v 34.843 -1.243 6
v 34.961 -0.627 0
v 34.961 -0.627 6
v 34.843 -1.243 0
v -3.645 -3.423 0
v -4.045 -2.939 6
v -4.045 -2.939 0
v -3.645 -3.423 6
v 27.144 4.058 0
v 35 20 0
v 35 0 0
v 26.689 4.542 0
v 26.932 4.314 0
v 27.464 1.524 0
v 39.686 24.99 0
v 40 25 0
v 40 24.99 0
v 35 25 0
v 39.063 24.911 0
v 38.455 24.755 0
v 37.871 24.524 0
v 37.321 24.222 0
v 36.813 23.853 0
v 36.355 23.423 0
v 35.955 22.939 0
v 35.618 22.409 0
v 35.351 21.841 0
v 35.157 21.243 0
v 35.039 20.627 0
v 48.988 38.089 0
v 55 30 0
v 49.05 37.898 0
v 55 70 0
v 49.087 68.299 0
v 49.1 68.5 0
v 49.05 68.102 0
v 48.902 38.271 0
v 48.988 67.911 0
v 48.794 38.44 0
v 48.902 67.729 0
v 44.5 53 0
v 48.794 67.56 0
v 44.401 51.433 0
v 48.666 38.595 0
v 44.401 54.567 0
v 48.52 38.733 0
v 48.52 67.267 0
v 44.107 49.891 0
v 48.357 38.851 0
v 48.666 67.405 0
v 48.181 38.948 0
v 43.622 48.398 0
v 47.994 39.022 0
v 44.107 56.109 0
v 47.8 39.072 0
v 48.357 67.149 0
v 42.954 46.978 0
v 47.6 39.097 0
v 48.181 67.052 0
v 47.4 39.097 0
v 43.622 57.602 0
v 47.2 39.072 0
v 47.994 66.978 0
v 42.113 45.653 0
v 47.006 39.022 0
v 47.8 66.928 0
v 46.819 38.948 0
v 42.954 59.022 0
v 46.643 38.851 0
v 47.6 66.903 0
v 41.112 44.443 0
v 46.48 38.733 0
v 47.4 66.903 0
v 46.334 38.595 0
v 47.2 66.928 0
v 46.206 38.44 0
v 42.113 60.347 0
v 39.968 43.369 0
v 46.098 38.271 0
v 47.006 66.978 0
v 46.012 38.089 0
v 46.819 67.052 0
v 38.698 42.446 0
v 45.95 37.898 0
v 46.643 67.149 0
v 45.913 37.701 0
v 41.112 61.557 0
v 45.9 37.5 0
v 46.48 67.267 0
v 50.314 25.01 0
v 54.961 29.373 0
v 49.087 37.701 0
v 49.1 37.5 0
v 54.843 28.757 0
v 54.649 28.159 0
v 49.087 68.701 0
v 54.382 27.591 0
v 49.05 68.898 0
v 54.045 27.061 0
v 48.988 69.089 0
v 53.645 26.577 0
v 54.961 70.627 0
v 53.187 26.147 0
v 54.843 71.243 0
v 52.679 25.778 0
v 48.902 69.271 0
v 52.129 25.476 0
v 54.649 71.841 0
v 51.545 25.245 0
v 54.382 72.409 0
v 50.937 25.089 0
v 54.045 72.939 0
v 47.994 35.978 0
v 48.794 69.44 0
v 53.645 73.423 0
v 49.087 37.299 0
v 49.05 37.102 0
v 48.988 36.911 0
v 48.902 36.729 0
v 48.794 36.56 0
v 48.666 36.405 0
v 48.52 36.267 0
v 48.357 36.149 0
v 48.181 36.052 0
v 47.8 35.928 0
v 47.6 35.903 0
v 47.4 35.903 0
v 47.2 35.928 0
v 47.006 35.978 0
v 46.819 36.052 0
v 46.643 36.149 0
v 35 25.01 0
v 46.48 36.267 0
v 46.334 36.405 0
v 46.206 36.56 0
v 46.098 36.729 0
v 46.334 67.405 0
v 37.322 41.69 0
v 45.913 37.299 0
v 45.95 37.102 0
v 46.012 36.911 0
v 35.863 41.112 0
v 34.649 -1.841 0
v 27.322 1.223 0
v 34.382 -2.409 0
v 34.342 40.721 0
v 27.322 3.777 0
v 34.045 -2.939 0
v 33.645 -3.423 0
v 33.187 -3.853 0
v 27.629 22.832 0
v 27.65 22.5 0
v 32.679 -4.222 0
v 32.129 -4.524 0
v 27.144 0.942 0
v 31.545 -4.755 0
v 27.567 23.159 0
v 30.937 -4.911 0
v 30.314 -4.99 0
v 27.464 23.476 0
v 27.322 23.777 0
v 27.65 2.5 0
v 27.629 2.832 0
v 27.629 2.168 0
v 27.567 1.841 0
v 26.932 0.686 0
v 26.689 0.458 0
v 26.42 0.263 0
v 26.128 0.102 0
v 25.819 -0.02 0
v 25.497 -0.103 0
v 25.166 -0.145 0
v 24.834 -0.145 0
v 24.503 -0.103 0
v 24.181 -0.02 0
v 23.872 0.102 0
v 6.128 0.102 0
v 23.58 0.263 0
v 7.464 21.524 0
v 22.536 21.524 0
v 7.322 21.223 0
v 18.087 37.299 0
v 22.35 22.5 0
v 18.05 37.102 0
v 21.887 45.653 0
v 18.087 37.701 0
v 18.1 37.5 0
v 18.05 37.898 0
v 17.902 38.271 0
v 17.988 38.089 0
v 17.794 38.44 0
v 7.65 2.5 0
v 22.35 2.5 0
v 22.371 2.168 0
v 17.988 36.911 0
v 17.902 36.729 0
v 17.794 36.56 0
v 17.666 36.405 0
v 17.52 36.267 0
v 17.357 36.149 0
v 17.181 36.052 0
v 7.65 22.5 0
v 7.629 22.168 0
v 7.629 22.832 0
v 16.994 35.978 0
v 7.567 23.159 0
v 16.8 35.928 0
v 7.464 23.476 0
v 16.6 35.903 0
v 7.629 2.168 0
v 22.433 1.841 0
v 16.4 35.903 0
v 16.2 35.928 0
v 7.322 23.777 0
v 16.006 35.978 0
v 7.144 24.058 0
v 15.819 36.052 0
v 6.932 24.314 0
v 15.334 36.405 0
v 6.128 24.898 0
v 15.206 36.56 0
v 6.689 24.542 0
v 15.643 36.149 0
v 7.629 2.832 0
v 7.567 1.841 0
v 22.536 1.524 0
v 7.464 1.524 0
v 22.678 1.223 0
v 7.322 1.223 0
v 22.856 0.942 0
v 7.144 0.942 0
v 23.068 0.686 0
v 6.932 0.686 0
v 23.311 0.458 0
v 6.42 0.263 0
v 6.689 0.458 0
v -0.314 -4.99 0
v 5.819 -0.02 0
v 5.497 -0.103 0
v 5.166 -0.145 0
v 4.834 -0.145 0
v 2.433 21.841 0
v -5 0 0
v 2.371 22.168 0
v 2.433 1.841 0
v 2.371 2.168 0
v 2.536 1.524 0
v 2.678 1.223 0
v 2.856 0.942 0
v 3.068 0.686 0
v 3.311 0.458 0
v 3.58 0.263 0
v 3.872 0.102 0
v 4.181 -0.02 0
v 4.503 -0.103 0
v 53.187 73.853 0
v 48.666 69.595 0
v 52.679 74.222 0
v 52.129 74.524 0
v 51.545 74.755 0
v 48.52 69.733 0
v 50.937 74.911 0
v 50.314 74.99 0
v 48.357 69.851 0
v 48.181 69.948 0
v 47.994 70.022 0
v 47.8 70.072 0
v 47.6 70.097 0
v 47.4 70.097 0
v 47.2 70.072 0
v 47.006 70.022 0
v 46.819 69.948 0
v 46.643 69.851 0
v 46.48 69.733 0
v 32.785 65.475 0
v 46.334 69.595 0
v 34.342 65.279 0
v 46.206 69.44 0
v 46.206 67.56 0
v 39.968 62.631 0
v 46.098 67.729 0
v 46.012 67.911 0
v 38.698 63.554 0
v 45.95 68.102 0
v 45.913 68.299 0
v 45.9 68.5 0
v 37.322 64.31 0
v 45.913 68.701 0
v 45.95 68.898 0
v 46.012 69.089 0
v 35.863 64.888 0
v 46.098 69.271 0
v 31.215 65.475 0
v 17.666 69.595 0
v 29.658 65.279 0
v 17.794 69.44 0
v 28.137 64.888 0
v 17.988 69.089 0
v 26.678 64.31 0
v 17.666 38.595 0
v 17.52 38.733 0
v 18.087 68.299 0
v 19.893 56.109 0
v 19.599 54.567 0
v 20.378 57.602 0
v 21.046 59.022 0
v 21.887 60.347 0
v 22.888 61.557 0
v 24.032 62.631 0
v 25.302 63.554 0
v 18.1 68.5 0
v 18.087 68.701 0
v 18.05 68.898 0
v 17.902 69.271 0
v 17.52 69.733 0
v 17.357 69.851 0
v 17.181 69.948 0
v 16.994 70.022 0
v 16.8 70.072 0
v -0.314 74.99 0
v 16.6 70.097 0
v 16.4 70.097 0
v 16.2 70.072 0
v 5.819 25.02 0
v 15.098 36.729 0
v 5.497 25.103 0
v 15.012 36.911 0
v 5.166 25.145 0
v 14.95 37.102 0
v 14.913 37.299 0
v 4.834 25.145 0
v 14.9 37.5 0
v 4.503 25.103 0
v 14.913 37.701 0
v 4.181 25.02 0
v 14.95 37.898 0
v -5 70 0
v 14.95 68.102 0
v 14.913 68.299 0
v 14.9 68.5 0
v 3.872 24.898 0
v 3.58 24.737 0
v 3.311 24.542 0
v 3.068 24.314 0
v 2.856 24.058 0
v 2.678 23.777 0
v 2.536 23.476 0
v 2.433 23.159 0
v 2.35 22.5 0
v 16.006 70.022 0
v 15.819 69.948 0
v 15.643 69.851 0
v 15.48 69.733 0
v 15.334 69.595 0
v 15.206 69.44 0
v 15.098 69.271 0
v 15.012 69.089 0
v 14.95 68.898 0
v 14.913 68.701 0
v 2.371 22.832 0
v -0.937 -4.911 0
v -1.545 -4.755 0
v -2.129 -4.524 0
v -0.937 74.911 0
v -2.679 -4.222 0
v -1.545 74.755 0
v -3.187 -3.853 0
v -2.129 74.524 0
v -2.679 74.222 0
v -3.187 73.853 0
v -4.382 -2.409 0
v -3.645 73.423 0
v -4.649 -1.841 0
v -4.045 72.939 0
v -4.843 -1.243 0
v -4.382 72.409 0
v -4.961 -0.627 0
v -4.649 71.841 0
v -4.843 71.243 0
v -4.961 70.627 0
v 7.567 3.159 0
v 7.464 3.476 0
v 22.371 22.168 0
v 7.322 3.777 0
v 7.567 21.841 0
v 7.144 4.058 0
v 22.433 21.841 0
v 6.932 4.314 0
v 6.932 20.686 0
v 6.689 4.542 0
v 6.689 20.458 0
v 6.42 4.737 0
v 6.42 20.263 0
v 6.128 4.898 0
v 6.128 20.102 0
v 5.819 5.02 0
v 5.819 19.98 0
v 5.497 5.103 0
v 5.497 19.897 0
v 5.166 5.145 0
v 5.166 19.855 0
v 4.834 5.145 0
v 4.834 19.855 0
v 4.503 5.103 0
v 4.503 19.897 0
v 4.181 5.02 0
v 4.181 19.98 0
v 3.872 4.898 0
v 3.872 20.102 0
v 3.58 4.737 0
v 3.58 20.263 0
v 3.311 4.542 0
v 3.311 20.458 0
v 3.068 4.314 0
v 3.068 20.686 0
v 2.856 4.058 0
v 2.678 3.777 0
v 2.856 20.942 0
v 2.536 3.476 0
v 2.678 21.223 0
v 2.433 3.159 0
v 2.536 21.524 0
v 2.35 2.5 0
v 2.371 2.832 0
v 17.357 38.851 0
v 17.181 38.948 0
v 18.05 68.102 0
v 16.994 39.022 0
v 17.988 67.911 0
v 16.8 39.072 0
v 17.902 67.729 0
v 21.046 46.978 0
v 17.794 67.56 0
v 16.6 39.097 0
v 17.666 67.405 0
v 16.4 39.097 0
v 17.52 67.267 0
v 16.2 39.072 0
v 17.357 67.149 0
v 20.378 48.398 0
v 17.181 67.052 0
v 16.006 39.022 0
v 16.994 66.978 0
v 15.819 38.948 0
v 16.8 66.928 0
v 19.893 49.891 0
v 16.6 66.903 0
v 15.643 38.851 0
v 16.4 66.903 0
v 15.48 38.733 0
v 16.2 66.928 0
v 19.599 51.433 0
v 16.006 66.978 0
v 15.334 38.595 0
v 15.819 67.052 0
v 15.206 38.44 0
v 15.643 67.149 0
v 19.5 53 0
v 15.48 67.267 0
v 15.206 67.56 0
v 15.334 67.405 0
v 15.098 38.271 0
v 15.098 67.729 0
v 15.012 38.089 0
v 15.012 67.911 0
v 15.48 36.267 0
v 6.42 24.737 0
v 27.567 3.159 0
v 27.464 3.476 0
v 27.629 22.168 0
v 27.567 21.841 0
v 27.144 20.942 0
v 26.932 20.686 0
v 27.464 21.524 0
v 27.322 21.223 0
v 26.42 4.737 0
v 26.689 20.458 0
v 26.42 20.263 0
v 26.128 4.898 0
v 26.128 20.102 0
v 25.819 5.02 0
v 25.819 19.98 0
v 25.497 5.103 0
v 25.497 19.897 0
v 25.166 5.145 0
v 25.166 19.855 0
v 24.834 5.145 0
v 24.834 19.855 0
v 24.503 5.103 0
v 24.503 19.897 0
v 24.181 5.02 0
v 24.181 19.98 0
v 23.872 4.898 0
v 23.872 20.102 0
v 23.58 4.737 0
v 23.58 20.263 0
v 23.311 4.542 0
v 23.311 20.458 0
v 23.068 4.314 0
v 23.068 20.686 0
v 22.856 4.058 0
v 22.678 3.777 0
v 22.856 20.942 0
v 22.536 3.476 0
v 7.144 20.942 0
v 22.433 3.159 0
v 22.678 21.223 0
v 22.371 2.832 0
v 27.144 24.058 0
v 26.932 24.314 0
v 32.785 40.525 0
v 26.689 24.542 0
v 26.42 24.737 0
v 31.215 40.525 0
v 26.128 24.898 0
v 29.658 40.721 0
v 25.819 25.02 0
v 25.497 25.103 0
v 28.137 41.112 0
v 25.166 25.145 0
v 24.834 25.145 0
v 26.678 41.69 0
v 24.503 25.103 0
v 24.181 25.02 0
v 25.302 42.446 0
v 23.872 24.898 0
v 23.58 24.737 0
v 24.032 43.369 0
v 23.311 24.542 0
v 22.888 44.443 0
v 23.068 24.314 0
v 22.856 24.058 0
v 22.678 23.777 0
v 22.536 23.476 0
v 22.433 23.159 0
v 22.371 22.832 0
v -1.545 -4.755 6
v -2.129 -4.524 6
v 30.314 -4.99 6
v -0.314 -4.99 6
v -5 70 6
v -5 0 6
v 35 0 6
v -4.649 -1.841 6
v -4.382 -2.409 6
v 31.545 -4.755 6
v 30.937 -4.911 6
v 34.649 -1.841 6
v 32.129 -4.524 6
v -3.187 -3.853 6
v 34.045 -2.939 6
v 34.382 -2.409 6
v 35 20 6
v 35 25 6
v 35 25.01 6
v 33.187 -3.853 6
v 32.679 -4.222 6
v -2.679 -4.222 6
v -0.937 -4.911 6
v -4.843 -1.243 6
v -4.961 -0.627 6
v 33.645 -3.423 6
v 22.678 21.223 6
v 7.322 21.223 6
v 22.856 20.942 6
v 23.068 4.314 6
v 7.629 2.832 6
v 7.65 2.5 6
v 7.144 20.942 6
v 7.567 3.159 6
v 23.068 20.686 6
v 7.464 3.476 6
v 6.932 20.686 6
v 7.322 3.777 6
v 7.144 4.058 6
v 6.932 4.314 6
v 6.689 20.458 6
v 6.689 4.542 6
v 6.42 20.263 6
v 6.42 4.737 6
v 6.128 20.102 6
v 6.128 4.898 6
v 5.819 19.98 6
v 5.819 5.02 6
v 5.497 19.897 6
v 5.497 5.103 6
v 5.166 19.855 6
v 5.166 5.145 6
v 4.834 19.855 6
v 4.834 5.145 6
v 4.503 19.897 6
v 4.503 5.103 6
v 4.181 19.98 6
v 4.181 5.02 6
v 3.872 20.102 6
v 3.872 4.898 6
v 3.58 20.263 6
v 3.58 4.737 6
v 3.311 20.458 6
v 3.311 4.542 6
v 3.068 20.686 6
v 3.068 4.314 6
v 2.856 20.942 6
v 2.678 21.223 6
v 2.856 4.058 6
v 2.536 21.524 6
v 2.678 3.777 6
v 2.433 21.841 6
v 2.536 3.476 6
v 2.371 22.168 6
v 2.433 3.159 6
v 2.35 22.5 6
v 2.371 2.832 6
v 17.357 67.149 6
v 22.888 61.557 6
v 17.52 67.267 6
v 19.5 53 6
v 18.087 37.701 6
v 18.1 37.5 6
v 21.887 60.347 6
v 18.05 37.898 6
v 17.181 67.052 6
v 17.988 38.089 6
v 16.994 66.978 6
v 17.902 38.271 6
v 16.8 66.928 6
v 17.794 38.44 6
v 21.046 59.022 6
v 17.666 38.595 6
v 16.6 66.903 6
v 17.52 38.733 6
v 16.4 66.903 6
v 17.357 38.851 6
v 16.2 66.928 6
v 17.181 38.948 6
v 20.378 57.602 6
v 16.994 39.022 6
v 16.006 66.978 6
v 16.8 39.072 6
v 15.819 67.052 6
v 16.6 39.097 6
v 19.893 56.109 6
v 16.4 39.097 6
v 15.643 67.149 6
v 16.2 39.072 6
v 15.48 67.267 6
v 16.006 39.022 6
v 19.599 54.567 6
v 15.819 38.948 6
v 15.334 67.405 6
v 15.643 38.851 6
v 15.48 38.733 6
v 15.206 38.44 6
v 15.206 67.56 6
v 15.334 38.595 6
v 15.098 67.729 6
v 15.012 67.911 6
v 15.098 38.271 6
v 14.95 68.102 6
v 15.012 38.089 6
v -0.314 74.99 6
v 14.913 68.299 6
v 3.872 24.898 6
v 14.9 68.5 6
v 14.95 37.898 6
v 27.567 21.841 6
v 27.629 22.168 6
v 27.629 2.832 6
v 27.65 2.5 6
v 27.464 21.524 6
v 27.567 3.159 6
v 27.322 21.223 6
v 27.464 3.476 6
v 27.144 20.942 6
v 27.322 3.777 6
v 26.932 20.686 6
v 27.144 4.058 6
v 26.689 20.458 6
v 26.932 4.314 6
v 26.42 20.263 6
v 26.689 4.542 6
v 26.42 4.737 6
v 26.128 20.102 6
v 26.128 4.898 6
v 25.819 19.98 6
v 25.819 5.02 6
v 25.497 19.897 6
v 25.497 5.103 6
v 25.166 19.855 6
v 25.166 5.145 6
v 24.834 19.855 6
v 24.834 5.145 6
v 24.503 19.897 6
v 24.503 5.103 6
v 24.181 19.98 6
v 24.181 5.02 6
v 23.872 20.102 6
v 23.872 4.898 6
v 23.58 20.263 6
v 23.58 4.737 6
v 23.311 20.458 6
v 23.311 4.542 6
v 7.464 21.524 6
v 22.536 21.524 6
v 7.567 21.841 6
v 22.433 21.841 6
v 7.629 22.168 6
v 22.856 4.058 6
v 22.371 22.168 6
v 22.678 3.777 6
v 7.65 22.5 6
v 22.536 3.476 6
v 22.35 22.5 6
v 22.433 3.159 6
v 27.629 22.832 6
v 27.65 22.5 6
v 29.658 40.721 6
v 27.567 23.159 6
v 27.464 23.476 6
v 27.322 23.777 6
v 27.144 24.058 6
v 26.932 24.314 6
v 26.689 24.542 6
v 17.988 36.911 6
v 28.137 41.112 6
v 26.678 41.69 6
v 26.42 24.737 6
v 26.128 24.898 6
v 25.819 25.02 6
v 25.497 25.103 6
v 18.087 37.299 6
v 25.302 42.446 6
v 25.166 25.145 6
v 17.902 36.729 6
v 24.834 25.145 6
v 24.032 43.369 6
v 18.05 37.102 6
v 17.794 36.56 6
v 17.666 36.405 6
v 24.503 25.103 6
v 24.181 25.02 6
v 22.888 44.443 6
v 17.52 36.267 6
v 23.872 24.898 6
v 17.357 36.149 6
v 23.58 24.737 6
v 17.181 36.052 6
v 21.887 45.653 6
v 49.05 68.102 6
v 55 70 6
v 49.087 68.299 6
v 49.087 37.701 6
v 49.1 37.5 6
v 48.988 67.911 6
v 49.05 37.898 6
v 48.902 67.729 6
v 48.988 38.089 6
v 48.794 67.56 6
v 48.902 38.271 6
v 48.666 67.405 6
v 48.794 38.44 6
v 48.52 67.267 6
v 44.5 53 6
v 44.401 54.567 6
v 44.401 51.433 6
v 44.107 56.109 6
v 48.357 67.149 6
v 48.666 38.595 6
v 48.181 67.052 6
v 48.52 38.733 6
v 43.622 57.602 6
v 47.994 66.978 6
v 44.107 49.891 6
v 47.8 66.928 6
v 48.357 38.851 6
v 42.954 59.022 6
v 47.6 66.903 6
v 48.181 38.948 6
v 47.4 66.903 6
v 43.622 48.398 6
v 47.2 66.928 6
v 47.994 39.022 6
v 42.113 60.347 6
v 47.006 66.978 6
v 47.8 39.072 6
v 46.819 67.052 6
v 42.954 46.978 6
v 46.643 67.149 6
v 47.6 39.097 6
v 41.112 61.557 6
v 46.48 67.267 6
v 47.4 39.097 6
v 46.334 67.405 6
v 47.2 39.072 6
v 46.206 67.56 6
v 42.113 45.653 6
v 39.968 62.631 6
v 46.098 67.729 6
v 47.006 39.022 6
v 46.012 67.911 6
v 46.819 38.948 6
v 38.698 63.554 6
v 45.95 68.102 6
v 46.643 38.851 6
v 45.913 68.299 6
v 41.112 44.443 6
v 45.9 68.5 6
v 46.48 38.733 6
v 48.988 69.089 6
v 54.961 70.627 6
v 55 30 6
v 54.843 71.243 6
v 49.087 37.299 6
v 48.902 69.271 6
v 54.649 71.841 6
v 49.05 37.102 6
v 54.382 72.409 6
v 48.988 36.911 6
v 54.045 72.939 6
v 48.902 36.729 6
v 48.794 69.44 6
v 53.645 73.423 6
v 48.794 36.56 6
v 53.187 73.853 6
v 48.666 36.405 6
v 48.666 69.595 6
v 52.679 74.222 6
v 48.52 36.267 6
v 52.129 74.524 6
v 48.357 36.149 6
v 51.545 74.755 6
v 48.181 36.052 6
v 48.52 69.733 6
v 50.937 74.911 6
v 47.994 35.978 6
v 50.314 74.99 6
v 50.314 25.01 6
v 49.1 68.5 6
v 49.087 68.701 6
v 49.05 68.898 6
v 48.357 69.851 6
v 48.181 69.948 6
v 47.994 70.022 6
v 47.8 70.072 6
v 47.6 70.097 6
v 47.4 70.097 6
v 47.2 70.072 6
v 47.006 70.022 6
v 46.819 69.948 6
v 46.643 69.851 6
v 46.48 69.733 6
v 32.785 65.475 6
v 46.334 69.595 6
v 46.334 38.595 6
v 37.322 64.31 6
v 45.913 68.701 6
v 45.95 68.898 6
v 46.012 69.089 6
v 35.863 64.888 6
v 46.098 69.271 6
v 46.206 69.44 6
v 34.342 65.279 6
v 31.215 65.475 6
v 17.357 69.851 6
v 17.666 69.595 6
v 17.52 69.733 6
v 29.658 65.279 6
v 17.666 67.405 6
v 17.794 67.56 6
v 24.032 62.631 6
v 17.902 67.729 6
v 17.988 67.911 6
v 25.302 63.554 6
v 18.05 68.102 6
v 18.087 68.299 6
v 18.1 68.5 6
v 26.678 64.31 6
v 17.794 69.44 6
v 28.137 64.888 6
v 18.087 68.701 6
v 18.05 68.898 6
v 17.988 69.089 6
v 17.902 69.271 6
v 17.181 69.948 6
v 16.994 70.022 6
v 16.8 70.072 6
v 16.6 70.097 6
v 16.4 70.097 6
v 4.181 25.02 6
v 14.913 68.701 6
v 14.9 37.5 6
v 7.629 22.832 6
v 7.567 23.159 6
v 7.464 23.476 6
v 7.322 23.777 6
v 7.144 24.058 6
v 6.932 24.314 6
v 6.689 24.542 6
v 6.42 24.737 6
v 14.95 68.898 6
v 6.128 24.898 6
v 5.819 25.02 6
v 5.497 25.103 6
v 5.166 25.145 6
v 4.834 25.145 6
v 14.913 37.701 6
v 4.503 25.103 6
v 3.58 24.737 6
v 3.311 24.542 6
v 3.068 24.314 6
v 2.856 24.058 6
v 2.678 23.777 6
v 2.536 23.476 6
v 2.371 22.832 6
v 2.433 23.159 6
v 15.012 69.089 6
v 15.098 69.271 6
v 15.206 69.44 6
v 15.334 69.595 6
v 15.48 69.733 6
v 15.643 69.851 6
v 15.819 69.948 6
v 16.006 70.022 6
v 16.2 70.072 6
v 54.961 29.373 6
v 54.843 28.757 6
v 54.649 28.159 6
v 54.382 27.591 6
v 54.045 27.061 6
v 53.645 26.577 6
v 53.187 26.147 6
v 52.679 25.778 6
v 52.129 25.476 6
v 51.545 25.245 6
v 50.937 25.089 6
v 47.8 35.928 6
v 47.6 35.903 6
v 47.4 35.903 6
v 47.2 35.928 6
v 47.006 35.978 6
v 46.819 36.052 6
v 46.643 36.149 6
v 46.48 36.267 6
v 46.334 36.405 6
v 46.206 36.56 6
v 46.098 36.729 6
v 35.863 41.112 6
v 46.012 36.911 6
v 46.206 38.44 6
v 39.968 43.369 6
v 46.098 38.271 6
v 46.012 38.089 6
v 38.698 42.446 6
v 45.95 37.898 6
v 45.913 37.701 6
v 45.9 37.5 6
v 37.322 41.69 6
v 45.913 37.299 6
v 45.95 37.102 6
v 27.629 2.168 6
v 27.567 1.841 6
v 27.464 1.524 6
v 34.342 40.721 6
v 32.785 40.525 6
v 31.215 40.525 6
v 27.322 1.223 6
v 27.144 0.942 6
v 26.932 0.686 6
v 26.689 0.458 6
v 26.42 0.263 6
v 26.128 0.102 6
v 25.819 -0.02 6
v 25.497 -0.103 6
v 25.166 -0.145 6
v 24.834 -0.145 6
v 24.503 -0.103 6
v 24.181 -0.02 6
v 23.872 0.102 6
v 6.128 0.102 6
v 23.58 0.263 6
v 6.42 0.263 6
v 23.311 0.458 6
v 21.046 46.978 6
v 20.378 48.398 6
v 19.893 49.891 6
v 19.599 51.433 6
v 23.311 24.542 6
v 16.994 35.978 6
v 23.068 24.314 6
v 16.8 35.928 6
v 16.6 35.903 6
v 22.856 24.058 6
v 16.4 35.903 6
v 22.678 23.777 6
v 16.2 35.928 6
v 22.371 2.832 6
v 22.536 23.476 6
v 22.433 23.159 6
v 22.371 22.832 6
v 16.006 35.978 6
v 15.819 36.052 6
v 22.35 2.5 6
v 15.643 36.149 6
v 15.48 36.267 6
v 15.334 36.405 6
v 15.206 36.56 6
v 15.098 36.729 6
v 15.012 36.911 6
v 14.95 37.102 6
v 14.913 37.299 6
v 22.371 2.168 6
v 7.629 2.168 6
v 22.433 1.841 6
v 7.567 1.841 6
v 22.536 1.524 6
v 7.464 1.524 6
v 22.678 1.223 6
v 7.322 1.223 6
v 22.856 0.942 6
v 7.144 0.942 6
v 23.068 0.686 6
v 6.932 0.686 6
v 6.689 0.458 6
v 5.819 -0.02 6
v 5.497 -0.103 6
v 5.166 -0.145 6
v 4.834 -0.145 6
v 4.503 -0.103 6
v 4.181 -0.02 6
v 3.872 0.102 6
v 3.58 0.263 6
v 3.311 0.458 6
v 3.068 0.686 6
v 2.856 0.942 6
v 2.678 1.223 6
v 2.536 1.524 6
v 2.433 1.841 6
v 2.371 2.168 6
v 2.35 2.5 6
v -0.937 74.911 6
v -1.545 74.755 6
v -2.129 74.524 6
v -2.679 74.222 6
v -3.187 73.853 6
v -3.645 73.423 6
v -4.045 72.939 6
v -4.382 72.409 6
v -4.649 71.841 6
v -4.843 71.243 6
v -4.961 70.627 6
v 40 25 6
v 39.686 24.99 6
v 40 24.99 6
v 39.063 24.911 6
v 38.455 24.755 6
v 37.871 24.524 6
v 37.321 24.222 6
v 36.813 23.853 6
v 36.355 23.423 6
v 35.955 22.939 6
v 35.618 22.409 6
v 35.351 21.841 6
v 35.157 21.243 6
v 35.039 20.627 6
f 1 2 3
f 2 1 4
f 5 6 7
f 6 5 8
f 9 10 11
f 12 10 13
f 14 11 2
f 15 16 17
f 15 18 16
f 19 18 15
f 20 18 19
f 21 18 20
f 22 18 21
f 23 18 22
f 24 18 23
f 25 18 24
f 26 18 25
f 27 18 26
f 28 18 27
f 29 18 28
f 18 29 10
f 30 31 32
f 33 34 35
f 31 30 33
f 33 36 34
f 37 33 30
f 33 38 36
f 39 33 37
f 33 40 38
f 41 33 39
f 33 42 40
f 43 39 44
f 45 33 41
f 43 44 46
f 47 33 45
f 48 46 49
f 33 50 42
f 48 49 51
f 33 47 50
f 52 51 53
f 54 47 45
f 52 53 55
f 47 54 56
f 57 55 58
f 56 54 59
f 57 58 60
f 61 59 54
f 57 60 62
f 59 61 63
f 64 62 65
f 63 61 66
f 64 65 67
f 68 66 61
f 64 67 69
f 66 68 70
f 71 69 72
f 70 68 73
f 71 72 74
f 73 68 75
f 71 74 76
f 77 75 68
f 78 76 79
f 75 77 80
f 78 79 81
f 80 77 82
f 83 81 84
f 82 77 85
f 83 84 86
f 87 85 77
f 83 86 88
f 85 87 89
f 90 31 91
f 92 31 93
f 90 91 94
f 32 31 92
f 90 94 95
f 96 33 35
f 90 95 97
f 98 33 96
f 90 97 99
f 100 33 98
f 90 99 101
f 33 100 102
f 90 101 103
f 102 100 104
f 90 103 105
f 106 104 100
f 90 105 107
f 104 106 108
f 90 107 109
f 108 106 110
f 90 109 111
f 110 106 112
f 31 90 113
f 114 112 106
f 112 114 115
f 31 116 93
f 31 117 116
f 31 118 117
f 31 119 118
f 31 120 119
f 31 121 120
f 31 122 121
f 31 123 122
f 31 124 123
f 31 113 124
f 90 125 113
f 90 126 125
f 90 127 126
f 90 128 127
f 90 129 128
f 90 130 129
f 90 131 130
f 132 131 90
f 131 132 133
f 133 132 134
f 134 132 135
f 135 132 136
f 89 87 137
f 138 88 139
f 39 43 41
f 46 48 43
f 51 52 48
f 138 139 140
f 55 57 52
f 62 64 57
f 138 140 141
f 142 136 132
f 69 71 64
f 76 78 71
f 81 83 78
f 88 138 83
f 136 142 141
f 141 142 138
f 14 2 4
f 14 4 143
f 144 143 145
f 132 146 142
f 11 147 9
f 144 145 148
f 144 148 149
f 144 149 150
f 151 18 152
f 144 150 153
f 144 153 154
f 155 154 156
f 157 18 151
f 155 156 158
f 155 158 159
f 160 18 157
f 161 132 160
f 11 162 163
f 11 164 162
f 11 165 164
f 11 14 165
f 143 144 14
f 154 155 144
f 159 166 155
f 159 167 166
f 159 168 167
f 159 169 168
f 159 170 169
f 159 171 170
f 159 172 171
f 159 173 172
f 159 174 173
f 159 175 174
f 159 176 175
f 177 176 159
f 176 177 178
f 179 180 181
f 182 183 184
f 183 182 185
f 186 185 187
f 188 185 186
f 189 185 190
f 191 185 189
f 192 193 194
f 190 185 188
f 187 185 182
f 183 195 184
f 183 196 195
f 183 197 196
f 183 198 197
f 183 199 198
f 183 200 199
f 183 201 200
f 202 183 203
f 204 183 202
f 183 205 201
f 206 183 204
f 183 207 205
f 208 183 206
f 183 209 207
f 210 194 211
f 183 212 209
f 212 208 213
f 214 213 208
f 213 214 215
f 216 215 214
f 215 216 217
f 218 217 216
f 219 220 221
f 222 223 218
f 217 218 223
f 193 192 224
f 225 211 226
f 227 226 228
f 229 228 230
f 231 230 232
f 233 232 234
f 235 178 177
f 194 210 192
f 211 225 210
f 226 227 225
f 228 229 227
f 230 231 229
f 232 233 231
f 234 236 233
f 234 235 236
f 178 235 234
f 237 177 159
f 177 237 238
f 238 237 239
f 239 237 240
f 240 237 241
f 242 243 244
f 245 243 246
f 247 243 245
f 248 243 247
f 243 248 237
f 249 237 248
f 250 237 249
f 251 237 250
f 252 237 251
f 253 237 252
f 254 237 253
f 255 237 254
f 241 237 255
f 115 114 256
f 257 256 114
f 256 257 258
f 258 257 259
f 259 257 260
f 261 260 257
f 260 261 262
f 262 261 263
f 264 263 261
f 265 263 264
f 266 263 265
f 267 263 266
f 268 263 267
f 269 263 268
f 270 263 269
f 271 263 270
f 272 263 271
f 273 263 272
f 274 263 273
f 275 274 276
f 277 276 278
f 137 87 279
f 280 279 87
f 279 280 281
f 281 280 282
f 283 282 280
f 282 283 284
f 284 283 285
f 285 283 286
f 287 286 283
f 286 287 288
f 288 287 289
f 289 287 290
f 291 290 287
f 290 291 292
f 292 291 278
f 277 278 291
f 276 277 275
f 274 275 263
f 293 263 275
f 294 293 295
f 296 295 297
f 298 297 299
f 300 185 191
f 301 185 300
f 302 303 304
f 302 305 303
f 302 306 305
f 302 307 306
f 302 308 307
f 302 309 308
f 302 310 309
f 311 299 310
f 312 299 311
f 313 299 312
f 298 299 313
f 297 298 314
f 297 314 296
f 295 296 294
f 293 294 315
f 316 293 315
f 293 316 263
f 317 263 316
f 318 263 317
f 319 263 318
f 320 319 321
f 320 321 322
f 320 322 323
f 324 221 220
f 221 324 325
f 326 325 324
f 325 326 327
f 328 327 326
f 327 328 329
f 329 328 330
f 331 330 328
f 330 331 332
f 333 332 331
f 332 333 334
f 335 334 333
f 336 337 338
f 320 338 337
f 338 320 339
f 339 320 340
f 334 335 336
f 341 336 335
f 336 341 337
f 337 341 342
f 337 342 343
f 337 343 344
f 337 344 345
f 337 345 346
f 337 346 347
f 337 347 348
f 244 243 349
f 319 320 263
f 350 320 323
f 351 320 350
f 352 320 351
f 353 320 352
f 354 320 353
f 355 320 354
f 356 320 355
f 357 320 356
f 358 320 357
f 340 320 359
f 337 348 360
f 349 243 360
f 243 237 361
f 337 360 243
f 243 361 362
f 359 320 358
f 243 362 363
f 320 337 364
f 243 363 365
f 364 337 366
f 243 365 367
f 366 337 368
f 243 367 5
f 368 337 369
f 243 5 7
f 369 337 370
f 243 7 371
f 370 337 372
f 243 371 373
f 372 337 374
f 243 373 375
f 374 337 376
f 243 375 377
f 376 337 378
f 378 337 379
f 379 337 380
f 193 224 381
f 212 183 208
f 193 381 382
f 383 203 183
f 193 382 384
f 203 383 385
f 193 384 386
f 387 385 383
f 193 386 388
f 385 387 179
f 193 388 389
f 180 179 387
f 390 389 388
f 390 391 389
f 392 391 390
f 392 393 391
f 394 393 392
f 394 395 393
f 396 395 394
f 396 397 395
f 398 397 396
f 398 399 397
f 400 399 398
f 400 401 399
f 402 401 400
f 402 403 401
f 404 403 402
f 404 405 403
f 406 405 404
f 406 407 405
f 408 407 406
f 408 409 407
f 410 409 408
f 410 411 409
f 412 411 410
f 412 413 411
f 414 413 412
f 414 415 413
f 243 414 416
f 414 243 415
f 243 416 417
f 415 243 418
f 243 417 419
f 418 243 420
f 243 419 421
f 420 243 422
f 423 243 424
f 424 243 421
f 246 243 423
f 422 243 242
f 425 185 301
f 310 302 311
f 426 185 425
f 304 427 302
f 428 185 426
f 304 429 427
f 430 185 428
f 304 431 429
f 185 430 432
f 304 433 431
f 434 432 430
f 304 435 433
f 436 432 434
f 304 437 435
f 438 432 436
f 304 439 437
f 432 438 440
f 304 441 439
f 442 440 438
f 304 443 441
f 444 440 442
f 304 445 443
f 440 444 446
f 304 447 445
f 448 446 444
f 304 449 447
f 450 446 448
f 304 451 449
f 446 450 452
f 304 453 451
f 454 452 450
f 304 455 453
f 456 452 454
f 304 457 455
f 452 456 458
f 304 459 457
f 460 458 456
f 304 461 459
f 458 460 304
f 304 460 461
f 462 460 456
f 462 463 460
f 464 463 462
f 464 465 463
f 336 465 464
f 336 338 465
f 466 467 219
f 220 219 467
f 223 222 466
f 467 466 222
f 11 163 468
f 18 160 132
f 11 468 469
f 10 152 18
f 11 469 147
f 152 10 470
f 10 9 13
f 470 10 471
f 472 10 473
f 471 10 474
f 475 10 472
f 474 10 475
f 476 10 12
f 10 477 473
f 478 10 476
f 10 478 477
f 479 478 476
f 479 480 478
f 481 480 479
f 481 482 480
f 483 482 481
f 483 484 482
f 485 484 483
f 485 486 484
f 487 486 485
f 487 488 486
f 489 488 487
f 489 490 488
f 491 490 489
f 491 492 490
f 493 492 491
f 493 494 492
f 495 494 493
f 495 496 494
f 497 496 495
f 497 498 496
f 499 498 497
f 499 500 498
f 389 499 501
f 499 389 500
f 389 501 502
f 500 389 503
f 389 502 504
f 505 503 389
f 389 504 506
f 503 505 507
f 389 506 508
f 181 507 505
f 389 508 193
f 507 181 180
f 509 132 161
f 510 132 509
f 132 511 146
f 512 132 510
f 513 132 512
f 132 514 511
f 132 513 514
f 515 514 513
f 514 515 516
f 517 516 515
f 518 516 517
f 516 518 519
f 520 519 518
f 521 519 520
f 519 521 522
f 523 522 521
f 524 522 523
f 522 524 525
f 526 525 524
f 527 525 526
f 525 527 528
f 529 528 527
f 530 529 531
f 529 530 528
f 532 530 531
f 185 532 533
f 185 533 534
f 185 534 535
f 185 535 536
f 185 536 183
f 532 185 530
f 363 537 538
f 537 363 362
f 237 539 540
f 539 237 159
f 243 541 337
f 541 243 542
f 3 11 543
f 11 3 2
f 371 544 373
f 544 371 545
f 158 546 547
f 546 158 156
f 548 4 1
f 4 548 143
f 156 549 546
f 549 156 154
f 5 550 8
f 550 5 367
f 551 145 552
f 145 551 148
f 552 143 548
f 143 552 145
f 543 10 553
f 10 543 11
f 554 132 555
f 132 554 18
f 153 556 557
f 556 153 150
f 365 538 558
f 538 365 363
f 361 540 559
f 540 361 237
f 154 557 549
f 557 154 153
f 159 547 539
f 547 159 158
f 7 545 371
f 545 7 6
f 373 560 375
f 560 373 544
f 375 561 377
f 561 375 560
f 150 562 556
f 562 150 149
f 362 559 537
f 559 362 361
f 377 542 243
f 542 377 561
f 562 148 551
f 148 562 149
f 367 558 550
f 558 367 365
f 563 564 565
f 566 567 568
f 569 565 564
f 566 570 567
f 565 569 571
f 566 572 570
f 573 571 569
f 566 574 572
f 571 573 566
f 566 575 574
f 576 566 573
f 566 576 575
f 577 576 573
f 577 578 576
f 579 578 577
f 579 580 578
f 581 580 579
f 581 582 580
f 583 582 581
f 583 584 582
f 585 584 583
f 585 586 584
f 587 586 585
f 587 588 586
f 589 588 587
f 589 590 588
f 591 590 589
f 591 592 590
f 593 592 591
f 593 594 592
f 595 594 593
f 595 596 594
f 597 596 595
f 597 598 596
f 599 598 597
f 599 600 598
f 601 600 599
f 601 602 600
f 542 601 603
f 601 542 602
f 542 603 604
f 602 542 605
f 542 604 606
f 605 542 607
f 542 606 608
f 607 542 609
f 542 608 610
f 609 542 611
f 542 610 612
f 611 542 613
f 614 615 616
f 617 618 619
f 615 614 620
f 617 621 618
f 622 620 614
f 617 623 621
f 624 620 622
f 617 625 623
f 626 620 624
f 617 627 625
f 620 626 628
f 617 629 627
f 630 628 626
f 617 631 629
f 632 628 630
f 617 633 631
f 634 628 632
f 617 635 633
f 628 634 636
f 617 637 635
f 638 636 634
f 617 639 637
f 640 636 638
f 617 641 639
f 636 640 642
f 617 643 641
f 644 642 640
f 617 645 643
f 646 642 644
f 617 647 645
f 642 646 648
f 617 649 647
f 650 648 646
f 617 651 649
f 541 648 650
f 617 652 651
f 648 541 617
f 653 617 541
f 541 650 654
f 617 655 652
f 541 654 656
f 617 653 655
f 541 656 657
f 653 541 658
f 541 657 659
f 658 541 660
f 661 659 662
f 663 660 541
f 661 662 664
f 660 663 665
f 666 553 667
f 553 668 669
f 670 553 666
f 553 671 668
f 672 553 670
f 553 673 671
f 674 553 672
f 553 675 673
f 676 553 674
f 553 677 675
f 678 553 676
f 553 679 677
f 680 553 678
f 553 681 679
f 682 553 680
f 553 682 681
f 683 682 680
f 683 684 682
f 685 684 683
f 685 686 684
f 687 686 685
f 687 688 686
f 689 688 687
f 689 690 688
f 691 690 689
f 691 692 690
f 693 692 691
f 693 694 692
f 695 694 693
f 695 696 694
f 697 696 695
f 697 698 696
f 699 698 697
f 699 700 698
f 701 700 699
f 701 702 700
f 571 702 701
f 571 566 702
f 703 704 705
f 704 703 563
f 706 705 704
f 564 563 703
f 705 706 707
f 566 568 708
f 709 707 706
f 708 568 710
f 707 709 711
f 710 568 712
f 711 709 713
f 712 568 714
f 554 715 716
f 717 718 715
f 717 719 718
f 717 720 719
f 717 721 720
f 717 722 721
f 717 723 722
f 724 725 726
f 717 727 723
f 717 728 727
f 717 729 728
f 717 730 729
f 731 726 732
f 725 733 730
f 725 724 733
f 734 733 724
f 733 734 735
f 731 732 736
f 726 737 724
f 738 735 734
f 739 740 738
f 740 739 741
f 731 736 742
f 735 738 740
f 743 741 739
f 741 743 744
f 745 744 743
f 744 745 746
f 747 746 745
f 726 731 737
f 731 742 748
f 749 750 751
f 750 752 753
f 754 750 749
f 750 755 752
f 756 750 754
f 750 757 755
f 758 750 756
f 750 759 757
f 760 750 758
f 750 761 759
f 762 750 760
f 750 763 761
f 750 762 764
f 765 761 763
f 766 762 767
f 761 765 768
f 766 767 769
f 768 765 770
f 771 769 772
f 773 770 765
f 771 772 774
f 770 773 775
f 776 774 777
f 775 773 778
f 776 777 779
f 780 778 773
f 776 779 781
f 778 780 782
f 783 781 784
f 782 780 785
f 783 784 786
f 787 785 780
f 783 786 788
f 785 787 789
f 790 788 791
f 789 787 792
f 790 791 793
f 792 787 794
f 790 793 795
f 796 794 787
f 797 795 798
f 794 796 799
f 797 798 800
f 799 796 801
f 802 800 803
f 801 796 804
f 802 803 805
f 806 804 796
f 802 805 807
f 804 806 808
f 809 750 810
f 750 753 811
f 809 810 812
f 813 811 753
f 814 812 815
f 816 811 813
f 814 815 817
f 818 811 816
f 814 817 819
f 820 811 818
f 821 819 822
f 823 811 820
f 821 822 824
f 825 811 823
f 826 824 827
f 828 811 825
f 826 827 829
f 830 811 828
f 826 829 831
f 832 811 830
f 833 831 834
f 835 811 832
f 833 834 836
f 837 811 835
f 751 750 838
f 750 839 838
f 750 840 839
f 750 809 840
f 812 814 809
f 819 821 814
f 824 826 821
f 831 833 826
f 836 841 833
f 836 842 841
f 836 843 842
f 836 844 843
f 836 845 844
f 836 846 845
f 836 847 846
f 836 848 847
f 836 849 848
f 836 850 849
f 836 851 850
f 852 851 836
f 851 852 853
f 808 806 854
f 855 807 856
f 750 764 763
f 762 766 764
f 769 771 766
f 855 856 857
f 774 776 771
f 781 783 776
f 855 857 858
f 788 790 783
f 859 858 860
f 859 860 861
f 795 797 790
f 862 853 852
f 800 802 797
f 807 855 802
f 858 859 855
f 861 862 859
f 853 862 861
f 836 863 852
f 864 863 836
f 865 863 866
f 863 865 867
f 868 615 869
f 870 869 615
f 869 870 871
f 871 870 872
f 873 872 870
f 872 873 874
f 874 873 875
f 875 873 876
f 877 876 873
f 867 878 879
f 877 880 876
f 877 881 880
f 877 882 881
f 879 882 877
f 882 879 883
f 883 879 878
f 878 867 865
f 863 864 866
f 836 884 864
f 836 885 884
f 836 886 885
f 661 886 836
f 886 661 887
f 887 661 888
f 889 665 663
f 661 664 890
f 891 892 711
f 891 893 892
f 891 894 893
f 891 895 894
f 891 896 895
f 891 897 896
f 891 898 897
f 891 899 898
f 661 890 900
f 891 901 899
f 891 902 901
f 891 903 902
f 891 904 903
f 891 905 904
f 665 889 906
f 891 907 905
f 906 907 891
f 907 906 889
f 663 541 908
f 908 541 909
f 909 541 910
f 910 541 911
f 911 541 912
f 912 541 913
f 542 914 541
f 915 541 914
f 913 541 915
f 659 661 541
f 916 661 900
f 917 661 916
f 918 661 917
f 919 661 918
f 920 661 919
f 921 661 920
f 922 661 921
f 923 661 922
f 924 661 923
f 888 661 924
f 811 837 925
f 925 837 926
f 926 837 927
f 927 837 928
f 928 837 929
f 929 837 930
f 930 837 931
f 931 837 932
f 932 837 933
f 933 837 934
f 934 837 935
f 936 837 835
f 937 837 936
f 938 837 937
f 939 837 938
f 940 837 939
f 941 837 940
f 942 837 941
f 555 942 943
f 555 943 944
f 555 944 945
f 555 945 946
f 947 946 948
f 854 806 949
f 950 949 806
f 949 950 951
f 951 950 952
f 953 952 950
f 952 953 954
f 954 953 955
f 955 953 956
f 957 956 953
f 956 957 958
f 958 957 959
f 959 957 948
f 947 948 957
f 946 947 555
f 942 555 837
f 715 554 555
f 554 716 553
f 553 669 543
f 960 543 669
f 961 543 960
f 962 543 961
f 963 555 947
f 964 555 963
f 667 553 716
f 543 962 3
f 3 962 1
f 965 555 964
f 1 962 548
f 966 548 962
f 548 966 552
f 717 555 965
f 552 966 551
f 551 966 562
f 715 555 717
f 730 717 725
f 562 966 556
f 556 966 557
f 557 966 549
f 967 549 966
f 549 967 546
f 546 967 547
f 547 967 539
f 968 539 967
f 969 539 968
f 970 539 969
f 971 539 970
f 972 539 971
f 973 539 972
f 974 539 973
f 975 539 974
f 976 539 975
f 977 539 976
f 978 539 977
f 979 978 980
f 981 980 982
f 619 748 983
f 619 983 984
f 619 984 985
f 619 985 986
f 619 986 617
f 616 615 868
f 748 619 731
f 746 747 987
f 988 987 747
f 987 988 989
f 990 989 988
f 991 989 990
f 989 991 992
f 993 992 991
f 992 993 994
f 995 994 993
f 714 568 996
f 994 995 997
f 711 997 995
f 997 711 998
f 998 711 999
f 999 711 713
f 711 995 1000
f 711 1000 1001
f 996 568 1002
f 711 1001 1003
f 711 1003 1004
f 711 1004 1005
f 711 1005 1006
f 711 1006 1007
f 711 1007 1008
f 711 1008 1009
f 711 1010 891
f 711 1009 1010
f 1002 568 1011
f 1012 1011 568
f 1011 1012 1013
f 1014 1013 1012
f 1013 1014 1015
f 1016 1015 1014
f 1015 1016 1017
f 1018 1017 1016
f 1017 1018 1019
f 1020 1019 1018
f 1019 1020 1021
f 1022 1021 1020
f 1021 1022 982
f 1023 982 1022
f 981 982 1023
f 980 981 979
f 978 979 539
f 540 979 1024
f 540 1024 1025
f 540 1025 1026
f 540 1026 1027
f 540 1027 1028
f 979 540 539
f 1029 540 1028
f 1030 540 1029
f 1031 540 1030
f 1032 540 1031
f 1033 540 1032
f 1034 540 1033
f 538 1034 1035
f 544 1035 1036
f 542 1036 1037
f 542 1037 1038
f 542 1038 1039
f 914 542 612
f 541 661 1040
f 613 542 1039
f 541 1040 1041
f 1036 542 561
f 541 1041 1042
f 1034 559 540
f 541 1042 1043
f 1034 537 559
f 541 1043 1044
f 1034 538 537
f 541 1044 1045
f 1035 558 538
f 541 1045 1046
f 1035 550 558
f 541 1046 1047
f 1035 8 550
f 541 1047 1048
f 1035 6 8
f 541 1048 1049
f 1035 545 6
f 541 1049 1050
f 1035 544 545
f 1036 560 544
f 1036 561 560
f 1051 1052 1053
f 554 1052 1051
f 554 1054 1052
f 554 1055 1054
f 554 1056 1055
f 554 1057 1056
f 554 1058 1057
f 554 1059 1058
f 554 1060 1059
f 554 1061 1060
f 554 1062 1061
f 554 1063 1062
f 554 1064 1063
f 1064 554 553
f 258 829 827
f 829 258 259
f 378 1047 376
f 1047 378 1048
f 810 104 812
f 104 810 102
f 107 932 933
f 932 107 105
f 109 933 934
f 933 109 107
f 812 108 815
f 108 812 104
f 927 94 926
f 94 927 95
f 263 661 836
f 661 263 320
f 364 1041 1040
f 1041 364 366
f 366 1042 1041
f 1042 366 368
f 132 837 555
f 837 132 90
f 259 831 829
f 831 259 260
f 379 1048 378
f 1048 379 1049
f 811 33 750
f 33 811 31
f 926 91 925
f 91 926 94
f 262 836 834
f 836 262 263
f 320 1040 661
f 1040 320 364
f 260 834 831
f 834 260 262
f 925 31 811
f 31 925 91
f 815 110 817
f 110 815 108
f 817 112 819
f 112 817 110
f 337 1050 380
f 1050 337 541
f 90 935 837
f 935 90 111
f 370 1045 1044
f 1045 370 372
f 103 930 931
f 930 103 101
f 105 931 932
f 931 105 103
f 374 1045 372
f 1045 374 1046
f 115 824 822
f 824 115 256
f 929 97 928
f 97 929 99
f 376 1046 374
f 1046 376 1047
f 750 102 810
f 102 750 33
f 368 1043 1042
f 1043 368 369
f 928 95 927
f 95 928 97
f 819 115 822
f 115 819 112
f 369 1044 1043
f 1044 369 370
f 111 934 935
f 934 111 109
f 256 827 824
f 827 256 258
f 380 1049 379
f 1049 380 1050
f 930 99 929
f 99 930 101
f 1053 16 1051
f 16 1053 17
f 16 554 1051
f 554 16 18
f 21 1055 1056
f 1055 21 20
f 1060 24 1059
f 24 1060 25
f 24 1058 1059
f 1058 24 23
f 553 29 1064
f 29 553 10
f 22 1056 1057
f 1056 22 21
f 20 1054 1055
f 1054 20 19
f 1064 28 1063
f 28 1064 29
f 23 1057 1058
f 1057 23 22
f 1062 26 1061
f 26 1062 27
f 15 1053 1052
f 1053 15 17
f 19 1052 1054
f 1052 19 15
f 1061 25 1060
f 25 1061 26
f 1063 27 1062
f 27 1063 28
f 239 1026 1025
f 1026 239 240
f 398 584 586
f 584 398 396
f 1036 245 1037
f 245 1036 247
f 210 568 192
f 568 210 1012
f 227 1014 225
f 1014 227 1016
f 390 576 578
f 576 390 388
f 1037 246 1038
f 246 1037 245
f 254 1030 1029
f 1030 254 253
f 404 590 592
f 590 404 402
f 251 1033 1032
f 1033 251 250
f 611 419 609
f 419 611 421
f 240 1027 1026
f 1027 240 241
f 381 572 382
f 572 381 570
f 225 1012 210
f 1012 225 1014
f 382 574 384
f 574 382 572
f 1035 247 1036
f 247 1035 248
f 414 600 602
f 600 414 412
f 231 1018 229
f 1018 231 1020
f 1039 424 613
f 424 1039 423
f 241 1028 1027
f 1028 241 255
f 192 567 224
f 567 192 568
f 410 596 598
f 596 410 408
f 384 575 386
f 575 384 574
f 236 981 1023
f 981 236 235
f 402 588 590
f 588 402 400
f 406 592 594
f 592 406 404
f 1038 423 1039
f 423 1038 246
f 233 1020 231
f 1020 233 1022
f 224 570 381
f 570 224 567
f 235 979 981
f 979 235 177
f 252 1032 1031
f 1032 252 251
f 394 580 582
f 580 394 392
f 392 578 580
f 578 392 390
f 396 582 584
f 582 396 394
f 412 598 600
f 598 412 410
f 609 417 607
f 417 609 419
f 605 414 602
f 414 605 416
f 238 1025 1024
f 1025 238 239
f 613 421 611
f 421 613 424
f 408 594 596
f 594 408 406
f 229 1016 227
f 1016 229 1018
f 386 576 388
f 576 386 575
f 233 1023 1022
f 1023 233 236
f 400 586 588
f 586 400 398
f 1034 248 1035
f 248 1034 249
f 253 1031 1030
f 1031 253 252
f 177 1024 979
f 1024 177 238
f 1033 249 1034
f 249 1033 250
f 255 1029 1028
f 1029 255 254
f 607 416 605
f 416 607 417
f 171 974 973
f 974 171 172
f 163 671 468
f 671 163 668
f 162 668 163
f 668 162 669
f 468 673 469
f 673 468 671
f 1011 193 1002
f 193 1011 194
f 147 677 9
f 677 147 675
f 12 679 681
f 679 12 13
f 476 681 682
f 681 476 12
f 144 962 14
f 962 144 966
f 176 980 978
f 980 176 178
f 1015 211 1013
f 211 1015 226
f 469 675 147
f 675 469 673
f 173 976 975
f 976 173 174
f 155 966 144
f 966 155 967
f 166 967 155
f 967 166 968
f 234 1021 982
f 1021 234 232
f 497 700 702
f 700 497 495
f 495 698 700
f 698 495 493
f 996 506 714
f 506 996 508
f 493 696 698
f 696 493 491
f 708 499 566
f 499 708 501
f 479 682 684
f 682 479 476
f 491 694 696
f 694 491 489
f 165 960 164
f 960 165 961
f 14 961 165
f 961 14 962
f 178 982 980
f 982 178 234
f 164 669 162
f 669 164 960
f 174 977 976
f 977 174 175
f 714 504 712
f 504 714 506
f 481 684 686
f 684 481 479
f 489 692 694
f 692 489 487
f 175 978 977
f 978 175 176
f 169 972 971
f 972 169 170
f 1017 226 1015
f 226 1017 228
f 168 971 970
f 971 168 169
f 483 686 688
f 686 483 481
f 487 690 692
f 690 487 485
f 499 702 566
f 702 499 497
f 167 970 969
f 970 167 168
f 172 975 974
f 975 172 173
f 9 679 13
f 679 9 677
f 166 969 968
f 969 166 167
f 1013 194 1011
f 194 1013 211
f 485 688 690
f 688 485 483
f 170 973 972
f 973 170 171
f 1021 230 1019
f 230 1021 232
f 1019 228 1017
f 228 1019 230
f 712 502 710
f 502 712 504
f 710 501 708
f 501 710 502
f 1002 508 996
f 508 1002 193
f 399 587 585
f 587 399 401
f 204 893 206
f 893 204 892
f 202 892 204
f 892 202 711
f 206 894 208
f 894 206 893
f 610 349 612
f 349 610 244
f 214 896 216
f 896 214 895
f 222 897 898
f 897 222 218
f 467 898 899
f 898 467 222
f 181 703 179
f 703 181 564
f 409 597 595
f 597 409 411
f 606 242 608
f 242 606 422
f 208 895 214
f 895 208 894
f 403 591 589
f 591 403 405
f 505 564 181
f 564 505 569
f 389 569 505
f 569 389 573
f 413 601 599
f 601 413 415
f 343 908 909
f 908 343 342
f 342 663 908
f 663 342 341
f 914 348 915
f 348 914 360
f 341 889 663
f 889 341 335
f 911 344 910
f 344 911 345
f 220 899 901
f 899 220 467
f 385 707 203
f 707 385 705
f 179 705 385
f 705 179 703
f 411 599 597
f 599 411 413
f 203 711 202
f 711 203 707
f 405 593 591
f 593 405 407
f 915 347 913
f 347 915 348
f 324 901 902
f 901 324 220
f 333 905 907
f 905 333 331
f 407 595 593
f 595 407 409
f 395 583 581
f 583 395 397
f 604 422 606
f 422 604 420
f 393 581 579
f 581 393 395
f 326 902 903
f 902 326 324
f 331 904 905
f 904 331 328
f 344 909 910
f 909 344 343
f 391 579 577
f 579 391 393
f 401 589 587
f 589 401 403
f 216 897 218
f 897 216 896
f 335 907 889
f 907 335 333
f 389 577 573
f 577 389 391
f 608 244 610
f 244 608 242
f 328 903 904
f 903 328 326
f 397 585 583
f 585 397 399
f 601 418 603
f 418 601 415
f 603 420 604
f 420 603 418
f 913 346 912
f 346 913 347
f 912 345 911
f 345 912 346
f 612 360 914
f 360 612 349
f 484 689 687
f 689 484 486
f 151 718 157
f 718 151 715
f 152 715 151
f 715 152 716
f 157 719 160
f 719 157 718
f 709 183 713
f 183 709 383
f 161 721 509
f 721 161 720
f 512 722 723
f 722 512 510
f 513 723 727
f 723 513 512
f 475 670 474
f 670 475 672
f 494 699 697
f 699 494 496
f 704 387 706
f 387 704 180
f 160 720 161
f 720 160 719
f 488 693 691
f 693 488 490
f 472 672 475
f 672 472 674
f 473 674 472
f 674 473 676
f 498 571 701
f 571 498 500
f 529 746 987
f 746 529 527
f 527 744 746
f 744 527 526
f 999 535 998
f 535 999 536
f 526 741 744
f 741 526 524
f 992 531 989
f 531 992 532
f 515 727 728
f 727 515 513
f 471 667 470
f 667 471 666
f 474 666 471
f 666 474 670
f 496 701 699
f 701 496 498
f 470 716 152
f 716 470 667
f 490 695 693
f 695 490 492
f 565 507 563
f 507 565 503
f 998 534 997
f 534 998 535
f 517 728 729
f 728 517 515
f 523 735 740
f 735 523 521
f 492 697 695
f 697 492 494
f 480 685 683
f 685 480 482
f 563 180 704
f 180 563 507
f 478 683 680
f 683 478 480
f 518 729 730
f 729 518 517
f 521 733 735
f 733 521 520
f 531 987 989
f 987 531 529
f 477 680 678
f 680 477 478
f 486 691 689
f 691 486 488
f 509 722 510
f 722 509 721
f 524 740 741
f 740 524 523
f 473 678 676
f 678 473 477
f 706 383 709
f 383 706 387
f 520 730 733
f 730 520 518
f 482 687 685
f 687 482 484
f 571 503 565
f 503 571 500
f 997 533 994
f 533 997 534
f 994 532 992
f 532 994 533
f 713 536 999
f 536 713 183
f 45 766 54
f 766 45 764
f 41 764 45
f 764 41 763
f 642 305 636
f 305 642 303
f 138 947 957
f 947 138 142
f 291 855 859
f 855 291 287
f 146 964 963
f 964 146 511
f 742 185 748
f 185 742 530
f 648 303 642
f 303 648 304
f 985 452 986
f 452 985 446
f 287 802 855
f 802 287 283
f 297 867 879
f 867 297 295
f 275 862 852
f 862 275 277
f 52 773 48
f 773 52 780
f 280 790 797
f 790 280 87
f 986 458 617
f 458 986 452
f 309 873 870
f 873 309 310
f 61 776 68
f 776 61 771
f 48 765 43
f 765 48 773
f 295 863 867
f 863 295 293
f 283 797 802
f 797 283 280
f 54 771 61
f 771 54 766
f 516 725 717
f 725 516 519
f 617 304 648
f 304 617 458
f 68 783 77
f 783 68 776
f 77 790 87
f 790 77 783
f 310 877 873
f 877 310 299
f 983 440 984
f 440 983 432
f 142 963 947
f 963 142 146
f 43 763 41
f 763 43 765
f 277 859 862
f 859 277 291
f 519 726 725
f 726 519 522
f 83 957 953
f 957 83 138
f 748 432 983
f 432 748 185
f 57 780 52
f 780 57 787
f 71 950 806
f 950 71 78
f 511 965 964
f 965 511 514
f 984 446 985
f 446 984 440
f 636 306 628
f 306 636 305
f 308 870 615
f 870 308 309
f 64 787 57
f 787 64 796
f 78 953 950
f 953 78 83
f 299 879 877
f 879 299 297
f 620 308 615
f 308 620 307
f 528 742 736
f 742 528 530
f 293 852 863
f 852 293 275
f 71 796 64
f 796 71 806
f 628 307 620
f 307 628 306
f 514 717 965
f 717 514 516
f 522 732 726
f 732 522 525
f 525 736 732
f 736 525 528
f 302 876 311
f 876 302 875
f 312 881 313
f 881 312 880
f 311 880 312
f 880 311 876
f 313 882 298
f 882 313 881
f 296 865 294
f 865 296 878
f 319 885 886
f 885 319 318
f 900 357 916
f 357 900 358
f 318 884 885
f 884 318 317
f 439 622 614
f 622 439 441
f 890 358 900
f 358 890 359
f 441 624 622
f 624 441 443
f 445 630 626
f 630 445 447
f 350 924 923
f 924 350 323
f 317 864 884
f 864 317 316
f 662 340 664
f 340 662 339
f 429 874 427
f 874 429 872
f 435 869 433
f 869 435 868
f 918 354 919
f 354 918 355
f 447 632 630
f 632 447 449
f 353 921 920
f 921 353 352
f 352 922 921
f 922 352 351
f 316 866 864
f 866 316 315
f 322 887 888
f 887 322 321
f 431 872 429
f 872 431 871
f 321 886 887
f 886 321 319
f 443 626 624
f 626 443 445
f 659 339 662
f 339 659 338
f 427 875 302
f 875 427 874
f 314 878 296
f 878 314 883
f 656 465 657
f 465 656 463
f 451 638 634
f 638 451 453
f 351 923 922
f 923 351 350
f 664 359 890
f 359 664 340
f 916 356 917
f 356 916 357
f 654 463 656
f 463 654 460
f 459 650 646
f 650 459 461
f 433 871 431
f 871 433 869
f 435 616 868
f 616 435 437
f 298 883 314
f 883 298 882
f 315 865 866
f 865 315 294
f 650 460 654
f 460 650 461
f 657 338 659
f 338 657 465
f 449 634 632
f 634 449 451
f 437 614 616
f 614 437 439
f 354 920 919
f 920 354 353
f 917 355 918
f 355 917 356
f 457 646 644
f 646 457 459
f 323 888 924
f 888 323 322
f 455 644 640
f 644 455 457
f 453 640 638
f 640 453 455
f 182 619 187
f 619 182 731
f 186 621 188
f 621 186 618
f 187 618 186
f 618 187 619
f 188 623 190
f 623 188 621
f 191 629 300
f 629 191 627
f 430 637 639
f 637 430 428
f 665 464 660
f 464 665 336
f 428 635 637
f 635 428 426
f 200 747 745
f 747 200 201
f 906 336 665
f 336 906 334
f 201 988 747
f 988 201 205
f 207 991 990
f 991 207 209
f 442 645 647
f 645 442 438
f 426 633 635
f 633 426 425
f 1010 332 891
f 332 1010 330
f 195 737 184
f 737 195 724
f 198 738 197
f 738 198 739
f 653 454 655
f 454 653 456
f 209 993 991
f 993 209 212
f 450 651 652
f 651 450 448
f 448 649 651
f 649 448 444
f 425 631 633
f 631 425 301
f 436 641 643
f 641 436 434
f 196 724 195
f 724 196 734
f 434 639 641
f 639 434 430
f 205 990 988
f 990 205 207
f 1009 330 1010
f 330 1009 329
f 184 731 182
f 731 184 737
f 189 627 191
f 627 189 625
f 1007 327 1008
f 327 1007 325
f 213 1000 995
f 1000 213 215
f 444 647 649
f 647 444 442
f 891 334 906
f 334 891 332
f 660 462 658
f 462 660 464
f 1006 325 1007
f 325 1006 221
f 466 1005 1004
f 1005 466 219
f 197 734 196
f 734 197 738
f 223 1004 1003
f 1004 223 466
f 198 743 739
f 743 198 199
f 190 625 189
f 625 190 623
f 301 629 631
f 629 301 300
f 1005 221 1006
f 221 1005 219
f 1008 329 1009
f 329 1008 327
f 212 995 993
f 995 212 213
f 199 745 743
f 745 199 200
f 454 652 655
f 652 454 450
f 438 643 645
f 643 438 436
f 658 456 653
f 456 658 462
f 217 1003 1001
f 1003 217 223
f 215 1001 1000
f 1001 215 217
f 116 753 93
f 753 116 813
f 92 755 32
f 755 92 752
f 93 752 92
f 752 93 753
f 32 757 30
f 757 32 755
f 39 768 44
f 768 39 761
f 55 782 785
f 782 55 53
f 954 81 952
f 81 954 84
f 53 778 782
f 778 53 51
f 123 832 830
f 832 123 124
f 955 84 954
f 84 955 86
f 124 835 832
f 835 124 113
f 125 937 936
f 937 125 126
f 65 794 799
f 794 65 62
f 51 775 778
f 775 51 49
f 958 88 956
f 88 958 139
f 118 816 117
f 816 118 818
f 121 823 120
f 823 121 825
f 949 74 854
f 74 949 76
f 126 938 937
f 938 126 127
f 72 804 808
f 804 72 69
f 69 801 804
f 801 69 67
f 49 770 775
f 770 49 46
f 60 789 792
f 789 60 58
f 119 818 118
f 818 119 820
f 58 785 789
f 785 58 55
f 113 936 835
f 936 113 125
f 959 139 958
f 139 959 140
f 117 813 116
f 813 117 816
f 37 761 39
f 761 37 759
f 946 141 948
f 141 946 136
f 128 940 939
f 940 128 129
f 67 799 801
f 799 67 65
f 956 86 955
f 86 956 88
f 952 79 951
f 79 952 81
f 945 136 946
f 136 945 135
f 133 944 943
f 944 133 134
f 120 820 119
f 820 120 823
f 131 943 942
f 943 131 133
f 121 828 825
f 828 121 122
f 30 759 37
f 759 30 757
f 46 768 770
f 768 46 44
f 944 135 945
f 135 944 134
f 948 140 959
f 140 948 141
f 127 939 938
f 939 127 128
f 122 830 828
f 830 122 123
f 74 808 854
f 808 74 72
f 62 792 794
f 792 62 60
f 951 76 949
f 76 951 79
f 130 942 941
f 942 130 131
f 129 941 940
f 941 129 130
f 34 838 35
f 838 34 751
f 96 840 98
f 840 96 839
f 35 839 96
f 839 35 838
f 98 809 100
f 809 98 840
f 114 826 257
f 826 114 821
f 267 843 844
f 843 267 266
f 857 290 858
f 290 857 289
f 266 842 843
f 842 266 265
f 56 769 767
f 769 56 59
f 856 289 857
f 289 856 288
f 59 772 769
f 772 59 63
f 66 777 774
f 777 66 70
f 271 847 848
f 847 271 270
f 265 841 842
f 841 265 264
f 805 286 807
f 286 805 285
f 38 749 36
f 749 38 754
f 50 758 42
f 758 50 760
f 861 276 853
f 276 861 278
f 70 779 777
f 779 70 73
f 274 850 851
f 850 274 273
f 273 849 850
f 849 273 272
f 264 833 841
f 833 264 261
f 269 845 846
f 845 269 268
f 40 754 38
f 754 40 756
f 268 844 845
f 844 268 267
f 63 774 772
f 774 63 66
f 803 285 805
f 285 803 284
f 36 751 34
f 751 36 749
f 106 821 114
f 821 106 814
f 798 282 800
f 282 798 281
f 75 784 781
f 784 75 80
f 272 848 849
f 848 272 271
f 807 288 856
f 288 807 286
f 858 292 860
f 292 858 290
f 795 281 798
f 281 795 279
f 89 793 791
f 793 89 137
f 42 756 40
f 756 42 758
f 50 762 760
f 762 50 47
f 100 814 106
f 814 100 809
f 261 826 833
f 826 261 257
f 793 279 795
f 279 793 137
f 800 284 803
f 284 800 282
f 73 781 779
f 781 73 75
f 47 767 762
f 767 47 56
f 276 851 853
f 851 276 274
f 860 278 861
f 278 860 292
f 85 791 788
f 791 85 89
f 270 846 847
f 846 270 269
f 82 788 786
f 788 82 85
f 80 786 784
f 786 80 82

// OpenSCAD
$fn=50;
$drill5=5.3;
$drill3=3.2;
$thickness=6;

$motorshaft=12.5;
$motormount=31;
$motoroffsetx=32;
$motoroffsety=53;

difference() {
    union() {
        hull() {
            translate([0,0,0]) cylinder(r=5, h=$thickness);
            translate([0,30,0]) cylinder(r=5, h=$thickness);
            translate([30,0,0]) cylinder(r=5, h=$thickness);
            translate([30,30,0]) cylinder(r=5, h=$thickness);
        }
        hull() {
            translate([0,30,0]) cylinder(r=5, h=$thickness);
            translate([0,70,0]) cylinder(r=5, h=$thickness);
            translate([50,30,0]) cylinder(r=5, h=$thickness);
            translate([50,70,0]) cylinder(r=5, h=$thickness);
        }
        translate([35,20,0]) cube([5,5,$thickness]);
    }
    translate([40,20,-1]) cylinder(r=5,h=$thickness+2);
    translate([5,2.5,-1]) cylinder(r=$drill5/2,h=$thickness+2);
    translate([25,2.5,-1]) cylinder(r=$drill5/2,h=$thickness+2);
    translate([5,22.5,-1]) cylinder(r=$drill5/2,h=$thickness+2);
    translate([25,22.5,-1]) cylinder(r=$drill5/2,h=$thickness+2);

    // Motor
    translate([$motoroffsetx, $motoroffsety,-1]) cylinder(r=$motorshaft,h=$thickness+2);
    translate([$motoroffsetx - $motormount/2, $motoroffsety + $motormount/2,-1]) cylinder(r=$drill3/2,h=$thickness+2);
    translate([$motoroffsetx - $motormount/2, $motoroffsety - $motormount/2,-1]) cylinder(r=$drill3/2,h=$thickness+2);
    translate([$motoroffsetx + $motormount/2, $motoroffsety - $motormount/2,-1]) cylinder(r=$drill3/2,h=$thickness+2);
    translate([$motoroffsetx + $motormount/2, $motoroffsety + $motormount/2,-1]) cylinder(r=$drill3/2,h=$thickness+2);

}
